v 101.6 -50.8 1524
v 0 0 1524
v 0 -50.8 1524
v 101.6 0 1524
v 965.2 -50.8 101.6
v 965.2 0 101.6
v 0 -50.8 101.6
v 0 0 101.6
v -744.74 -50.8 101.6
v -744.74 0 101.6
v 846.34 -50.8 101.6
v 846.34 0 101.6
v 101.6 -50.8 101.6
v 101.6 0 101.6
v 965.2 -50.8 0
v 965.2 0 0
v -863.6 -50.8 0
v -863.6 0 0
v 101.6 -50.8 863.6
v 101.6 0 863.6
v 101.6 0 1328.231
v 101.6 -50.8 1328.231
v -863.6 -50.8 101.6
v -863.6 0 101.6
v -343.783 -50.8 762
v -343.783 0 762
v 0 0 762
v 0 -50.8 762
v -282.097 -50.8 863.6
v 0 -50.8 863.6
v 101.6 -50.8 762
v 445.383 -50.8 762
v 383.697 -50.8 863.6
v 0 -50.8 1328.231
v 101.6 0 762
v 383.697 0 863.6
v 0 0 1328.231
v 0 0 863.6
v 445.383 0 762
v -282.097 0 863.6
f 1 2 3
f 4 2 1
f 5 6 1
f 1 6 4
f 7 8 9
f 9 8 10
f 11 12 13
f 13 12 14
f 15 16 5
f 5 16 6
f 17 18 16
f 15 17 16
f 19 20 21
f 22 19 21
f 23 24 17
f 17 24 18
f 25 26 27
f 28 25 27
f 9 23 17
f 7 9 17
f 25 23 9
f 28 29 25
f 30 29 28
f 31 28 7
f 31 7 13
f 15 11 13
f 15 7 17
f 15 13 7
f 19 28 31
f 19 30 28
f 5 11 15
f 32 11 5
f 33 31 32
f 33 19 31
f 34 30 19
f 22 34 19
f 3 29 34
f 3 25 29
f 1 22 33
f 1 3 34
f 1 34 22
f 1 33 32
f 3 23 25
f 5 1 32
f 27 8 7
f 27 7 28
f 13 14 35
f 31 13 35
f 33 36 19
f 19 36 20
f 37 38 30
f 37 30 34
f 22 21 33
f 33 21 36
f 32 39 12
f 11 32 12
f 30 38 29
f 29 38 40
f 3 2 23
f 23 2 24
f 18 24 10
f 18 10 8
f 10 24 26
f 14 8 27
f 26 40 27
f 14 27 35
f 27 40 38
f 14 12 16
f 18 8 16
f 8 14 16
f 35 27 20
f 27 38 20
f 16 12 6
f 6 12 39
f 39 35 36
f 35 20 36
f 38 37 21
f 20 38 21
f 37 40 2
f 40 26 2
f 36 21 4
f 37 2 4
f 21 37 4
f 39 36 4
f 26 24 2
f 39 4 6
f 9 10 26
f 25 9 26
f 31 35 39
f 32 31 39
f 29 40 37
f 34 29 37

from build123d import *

# Parameters (mm, degrees)
F0_W     = 101.6
F0_H     = 1524
F1_DEPTH = 50.8
F3_DEPTH = 50.8
F5_DEPTH = 50.8


with BuildPart() as f1:
    # F0 (on Front) → F1 (new body)
    with BuildSketch(Plane.XZ):
        with Locations((50.8, 762)):
            Rectangle(F0_W, F0_H)
    extrude(amount=F1_DEPTH)

    # F2 (on Front) → F3 (join)
    with BuildSketch(Plane.XZ):
        Polygon((0, 1524), (-863.6, 101.6), (-744.7400515441, 101.6), (0, 1328.2306731315), align=None)
        Polygon((-863.6, 0), (0, 0), (0, 101.6), (-744.7400515441, 101.6), (-863.6, 101.6), align=None)
        Polygon((101.6, 101.6), (101.6, 0), (965.2, 0), (965.2, 101.6), (846.3400515441, 101.6), align=None)
        Polygon((846.3400515441, 101.6), (965.2, 101.6), (101.6, 1524), (101.6, 1328.2306731315), align=None)
    extrude(amount=F3_DEPTH)

    # F4 (on Front) → F5 (join)
    with BuildSketch(Plane.XZ):
        Polygon((-343.782908687, 762), (0, 762), (0, 863.6), (-282.0971944012, 863.6), align=None)
        Polygon((383.6971944012, 863.6), (101.6, 863.6), (101.6, 762), (445.382908687, 762), align=None)
    extrude(amount=F5_DEPTH)


solid = f1.part
